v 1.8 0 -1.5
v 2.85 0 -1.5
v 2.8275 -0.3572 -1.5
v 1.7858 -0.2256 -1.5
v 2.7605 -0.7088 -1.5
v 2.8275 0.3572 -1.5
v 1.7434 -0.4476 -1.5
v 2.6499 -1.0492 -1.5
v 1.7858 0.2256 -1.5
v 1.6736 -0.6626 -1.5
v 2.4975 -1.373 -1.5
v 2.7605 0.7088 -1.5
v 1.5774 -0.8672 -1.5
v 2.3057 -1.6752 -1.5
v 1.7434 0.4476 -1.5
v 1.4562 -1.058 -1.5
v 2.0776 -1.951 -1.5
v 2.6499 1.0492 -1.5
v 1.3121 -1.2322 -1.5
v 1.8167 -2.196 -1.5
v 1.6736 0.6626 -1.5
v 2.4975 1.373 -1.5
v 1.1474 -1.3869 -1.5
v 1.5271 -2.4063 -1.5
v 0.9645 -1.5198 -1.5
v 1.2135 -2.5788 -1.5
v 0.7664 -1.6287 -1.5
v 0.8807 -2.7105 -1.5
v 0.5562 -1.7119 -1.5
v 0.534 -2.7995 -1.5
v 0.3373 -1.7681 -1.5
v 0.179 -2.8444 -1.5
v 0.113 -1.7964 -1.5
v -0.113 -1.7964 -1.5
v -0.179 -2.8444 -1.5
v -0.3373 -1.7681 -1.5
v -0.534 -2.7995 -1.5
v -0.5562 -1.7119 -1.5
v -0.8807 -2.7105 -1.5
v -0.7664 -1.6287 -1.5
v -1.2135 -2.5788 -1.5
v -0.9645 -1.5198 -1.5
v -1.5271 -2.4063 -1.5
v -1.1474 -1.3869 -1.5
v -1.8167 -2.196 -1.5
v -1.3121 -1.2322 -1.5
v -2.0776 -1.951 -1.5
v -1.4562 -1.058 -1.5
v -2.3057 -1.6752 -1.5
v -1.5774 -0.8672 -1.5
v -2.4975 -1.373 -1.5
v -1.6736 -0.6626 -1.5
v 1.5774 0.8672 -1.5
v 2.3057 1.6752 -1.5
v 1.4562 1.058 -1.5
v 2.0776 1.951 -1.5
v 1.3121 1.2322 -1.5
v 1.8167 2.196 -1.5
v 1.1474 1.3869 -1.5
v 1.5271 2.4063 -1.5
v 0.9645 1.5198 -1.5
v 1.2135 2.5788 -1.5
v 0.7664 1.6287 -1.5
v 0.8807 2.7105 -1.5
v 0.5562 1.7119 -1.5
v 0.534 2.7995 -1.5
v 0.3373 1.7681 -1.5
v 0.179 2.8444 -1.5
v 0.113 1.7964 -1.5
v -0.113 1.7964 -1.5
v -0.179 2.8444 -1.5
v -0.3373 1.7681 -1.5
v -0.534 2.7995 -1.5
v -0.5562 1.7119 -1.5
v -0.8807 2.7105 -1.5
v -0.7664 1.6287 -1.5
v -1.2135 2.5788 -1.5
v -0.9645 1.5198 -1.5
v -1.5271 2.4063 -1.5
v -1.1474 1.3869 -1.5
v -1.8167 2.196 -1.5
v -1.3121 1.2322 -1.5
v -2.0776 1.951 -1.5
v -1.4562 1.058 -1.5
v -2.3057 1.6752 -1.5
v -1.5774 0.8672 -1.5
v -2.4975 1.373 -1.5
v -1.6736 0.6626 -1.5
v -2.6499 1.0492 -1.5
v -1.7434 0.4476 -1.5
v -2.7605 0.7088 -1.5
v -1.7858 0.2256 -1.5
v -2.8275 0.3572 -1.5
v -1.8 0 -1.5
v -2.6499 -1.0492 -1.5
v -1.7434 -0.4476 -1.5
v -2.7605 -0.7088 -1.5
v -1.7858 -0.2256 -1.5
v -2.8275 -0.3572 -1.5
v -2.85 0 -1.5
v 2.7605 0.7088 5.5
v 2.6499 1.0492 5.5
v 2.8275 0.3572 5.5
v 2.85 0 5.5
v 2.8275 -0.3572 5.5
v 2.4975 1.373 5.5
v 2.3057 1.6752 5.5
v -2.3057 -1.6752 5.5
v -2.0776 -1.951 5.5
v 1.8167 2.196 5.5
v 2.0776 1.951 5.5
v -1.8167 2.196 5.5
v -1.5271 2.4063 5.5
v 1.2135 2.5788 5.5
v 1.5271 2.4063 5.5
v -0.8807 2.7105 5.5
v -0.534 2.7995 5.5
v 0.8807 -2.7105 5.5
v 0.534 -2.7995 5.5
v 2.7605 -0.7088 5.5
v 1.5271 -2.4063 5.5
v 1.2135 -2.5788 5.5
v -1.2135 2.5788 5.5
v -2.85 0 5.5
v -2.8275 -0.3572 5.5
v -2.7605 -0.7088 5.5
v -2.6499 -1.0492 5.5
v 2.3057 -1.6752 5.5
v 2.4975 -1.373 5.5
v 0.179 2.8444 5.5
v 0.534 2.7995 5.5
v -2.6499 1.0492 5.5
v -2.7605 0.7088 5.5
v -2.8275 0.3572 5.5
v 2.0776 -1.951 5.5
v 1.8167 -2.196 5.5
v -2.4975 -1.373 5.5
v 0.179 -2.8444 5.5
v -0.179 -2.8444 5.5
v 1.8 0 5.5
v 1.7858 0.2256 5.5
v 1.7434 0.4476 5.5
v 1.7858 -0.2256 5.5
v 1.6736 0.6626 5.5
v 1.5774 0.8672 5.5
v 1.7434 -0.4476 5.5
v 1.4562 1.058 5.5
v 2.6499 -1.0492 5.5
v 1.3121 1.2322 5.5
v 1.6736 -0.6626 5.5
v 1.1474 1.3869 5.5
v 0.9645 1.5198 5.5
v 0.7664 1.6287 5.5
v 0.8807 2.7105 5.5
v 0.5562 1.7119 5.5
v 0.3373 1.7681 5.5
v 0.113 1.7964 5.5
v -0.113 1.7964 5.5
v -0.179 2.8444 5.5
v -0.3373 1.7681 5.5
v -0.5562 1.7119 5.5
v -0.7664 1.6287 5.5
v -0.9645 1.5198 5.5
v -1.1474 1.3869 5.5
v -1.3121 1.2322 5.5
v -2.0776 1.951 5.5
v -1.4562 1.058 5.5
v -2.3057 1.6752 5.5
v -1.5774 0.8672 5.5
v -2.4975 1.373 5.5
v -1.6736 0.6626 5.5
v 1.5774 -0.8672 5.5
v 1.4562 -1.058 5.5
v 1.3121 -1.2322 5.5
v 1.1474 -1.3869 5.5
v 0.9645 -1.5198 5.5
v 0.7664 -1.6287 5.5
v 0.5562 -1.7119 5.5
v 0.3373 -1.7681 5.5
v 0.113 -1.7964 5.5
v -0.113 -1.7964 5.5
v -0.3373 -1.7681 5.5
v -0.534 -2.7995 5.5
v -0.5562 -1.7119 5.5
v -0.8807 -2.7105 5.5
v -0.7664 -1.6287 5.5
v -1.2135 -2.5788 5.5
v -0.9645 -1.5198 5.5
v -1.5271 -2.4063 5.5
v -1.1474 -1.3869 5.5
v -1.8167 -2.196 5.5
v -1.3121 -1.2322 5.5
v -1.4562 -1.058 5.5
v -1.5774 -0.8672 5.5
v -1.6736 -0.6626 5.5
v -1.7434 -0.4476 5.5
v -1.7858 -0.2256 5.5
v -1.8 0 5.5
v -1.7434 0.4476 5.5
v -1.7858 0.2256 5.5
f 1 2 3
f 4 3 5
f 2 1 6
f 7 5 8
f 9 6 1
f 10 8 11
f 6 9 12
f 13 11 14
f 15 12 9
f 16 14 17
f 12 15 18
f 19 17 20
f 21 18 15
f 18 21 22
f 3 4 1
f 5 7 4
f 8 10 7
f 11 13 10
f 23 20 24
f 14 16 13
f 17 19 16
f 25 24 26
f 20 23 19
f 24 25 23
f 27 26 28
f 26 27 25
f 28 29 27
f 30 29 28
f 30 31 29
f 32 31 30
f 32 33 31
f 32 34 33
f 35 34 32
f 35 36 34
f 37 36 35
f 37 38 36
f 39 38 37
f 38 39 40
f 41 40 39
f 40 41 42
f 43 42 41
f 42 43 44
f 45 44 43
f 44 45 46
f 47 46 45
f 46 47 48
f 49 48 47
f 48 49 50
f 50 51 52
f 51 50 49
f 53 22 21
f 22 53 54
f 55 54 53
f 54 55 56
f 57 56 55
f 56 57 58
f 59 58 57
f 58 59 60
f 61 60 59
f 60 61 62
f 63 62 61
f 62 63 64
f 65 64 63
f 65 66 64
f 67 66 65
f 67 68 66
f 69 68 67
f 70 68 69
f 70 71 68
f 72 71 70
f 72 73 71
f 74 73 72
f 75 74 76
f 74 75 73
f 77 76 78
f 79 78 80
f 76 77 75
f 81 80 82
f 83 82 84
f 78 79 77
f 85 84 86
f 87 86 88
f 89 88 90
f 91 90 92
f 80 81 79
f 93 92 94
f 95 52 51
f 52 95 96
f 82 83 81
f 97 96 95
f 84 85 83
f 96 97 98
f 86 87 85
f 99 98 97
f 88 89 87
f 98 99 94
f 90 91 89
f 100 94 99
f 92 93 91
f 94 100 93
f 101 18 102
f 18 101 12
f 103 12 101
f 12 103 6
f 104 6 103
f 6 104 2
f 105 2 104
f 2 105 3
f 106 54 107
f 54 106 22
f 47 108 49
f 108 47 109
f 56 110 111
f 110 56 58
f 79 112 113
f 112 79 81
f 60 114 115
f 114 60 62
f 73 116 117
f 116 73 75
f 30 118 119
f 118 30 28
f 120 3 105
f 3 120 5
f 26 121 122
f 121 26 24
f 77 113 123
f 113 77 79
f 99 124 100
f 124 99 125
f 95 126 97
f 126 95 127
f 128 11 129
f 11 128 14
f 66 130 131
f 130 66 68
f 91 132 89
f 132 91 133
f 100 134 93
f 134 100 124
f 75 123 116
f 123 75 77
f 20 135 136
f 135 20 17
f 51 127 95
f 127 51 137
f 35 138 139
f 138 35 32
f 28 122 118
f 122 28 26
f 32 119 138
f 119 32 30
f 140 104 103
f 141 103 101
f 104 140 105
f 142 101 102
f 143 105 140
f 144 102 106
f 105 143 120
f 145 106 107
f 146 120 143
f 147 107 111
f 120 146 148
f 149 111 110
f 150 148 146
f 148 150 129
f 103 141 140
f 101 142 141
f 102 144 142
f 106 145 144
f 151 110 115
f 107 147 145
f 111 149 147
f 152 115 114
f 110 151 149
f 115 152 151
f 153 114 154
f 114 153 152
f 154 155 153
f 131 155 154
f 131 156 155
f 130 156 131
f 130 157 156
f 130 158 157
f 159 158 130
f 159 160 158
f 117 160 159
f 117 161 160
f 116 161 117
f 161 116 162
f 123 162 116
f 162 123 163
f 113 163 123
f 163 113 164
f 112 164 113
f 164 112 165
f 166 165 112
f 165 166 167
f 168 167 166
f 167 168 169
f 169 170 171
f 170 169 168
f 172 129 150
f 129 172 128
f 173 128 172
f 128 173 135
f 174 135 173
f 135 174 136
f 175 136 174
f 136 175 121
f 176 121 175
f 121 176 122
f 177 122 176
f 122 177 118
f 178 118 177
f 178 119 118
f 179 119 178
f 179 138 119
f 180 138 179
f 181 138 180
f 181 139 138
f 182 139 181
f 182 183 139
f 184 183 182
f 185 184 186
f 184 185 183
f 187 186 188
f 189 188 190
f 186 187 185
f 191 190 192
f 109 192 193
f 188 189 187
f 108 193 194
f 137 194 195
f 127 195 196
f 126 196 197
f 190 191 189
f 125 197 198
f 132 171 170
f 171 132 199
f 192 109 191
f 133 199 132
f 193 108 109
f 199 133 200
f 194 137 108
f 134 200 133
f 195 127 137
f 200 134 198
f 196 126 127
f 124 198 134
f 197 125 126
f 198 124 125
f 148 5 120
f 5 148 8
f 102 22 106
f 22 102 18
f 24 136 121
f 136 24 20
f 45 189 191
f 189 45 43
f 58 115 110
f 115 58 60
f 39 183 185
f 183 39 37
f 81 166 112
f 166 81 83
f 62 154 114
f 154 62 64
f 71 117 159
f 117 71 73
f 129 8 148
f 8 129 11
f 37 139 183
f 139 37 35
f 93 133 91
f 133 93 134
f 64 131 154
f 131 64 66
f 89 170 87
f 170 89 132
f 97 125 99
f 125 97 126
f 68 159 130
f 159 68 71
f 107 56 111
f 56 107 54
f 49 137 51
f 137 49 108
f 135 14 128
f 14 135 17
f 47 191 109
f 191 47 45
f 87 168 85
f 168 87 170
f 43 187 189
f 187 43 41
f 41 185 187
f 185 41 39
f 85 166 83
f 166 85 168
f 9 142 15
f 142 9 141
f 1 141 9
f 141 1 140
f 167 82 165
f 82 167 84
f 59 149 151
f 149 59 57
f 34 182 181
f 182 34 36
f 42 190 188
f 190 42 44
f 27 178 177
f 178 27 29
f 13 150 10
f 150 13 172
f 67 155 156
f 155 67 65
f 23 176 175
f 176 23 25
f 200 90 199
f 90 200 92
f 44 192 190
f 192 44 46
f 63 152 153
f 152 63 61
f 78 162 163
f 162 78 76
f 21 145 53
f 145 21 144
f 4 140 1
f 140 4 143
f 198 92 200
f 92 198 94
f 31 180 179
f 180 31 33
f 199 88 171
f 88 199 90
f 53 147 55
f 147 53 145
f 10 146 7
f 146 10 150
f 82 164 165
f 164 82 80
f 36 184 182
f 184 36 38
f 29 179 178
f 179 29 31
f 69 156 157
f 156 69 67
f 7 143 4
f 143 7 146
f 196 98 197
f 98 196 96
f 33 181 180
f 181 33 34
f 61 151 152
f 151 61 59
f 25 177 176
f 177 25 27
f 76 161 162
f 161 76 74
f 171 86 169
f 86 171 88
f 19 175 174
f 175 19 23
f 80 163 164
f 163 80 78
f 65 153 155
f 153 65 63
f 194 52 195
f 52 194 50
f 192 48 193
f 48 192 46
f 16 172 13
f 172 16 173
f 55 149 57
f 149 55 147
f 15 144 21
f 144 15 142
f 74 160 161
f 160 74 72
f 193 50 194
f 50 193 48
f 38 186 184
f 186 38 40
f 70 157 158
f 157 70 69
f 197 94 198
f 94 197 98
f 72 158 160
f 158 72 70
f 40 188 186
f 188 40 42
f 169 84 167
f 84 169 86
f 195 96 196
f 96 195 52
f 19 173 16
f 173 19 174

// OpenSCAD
$fn = 50;


difference() {
	union() {
		translate(v = [0, 0, -1.5000000000]) {
			cylinder(h = 3, r = 1.0000000000);
		}
		translate(v = [0, 0, -1.5000000000]) {
			cylinder(h = 7, r = 2.8500000000);
		}
	}
	union() {
		translate(v = [0, 0, -50.0000000000]) {
			cylinder(h = 100, r = 1.8000000000);
		}
	}
}
